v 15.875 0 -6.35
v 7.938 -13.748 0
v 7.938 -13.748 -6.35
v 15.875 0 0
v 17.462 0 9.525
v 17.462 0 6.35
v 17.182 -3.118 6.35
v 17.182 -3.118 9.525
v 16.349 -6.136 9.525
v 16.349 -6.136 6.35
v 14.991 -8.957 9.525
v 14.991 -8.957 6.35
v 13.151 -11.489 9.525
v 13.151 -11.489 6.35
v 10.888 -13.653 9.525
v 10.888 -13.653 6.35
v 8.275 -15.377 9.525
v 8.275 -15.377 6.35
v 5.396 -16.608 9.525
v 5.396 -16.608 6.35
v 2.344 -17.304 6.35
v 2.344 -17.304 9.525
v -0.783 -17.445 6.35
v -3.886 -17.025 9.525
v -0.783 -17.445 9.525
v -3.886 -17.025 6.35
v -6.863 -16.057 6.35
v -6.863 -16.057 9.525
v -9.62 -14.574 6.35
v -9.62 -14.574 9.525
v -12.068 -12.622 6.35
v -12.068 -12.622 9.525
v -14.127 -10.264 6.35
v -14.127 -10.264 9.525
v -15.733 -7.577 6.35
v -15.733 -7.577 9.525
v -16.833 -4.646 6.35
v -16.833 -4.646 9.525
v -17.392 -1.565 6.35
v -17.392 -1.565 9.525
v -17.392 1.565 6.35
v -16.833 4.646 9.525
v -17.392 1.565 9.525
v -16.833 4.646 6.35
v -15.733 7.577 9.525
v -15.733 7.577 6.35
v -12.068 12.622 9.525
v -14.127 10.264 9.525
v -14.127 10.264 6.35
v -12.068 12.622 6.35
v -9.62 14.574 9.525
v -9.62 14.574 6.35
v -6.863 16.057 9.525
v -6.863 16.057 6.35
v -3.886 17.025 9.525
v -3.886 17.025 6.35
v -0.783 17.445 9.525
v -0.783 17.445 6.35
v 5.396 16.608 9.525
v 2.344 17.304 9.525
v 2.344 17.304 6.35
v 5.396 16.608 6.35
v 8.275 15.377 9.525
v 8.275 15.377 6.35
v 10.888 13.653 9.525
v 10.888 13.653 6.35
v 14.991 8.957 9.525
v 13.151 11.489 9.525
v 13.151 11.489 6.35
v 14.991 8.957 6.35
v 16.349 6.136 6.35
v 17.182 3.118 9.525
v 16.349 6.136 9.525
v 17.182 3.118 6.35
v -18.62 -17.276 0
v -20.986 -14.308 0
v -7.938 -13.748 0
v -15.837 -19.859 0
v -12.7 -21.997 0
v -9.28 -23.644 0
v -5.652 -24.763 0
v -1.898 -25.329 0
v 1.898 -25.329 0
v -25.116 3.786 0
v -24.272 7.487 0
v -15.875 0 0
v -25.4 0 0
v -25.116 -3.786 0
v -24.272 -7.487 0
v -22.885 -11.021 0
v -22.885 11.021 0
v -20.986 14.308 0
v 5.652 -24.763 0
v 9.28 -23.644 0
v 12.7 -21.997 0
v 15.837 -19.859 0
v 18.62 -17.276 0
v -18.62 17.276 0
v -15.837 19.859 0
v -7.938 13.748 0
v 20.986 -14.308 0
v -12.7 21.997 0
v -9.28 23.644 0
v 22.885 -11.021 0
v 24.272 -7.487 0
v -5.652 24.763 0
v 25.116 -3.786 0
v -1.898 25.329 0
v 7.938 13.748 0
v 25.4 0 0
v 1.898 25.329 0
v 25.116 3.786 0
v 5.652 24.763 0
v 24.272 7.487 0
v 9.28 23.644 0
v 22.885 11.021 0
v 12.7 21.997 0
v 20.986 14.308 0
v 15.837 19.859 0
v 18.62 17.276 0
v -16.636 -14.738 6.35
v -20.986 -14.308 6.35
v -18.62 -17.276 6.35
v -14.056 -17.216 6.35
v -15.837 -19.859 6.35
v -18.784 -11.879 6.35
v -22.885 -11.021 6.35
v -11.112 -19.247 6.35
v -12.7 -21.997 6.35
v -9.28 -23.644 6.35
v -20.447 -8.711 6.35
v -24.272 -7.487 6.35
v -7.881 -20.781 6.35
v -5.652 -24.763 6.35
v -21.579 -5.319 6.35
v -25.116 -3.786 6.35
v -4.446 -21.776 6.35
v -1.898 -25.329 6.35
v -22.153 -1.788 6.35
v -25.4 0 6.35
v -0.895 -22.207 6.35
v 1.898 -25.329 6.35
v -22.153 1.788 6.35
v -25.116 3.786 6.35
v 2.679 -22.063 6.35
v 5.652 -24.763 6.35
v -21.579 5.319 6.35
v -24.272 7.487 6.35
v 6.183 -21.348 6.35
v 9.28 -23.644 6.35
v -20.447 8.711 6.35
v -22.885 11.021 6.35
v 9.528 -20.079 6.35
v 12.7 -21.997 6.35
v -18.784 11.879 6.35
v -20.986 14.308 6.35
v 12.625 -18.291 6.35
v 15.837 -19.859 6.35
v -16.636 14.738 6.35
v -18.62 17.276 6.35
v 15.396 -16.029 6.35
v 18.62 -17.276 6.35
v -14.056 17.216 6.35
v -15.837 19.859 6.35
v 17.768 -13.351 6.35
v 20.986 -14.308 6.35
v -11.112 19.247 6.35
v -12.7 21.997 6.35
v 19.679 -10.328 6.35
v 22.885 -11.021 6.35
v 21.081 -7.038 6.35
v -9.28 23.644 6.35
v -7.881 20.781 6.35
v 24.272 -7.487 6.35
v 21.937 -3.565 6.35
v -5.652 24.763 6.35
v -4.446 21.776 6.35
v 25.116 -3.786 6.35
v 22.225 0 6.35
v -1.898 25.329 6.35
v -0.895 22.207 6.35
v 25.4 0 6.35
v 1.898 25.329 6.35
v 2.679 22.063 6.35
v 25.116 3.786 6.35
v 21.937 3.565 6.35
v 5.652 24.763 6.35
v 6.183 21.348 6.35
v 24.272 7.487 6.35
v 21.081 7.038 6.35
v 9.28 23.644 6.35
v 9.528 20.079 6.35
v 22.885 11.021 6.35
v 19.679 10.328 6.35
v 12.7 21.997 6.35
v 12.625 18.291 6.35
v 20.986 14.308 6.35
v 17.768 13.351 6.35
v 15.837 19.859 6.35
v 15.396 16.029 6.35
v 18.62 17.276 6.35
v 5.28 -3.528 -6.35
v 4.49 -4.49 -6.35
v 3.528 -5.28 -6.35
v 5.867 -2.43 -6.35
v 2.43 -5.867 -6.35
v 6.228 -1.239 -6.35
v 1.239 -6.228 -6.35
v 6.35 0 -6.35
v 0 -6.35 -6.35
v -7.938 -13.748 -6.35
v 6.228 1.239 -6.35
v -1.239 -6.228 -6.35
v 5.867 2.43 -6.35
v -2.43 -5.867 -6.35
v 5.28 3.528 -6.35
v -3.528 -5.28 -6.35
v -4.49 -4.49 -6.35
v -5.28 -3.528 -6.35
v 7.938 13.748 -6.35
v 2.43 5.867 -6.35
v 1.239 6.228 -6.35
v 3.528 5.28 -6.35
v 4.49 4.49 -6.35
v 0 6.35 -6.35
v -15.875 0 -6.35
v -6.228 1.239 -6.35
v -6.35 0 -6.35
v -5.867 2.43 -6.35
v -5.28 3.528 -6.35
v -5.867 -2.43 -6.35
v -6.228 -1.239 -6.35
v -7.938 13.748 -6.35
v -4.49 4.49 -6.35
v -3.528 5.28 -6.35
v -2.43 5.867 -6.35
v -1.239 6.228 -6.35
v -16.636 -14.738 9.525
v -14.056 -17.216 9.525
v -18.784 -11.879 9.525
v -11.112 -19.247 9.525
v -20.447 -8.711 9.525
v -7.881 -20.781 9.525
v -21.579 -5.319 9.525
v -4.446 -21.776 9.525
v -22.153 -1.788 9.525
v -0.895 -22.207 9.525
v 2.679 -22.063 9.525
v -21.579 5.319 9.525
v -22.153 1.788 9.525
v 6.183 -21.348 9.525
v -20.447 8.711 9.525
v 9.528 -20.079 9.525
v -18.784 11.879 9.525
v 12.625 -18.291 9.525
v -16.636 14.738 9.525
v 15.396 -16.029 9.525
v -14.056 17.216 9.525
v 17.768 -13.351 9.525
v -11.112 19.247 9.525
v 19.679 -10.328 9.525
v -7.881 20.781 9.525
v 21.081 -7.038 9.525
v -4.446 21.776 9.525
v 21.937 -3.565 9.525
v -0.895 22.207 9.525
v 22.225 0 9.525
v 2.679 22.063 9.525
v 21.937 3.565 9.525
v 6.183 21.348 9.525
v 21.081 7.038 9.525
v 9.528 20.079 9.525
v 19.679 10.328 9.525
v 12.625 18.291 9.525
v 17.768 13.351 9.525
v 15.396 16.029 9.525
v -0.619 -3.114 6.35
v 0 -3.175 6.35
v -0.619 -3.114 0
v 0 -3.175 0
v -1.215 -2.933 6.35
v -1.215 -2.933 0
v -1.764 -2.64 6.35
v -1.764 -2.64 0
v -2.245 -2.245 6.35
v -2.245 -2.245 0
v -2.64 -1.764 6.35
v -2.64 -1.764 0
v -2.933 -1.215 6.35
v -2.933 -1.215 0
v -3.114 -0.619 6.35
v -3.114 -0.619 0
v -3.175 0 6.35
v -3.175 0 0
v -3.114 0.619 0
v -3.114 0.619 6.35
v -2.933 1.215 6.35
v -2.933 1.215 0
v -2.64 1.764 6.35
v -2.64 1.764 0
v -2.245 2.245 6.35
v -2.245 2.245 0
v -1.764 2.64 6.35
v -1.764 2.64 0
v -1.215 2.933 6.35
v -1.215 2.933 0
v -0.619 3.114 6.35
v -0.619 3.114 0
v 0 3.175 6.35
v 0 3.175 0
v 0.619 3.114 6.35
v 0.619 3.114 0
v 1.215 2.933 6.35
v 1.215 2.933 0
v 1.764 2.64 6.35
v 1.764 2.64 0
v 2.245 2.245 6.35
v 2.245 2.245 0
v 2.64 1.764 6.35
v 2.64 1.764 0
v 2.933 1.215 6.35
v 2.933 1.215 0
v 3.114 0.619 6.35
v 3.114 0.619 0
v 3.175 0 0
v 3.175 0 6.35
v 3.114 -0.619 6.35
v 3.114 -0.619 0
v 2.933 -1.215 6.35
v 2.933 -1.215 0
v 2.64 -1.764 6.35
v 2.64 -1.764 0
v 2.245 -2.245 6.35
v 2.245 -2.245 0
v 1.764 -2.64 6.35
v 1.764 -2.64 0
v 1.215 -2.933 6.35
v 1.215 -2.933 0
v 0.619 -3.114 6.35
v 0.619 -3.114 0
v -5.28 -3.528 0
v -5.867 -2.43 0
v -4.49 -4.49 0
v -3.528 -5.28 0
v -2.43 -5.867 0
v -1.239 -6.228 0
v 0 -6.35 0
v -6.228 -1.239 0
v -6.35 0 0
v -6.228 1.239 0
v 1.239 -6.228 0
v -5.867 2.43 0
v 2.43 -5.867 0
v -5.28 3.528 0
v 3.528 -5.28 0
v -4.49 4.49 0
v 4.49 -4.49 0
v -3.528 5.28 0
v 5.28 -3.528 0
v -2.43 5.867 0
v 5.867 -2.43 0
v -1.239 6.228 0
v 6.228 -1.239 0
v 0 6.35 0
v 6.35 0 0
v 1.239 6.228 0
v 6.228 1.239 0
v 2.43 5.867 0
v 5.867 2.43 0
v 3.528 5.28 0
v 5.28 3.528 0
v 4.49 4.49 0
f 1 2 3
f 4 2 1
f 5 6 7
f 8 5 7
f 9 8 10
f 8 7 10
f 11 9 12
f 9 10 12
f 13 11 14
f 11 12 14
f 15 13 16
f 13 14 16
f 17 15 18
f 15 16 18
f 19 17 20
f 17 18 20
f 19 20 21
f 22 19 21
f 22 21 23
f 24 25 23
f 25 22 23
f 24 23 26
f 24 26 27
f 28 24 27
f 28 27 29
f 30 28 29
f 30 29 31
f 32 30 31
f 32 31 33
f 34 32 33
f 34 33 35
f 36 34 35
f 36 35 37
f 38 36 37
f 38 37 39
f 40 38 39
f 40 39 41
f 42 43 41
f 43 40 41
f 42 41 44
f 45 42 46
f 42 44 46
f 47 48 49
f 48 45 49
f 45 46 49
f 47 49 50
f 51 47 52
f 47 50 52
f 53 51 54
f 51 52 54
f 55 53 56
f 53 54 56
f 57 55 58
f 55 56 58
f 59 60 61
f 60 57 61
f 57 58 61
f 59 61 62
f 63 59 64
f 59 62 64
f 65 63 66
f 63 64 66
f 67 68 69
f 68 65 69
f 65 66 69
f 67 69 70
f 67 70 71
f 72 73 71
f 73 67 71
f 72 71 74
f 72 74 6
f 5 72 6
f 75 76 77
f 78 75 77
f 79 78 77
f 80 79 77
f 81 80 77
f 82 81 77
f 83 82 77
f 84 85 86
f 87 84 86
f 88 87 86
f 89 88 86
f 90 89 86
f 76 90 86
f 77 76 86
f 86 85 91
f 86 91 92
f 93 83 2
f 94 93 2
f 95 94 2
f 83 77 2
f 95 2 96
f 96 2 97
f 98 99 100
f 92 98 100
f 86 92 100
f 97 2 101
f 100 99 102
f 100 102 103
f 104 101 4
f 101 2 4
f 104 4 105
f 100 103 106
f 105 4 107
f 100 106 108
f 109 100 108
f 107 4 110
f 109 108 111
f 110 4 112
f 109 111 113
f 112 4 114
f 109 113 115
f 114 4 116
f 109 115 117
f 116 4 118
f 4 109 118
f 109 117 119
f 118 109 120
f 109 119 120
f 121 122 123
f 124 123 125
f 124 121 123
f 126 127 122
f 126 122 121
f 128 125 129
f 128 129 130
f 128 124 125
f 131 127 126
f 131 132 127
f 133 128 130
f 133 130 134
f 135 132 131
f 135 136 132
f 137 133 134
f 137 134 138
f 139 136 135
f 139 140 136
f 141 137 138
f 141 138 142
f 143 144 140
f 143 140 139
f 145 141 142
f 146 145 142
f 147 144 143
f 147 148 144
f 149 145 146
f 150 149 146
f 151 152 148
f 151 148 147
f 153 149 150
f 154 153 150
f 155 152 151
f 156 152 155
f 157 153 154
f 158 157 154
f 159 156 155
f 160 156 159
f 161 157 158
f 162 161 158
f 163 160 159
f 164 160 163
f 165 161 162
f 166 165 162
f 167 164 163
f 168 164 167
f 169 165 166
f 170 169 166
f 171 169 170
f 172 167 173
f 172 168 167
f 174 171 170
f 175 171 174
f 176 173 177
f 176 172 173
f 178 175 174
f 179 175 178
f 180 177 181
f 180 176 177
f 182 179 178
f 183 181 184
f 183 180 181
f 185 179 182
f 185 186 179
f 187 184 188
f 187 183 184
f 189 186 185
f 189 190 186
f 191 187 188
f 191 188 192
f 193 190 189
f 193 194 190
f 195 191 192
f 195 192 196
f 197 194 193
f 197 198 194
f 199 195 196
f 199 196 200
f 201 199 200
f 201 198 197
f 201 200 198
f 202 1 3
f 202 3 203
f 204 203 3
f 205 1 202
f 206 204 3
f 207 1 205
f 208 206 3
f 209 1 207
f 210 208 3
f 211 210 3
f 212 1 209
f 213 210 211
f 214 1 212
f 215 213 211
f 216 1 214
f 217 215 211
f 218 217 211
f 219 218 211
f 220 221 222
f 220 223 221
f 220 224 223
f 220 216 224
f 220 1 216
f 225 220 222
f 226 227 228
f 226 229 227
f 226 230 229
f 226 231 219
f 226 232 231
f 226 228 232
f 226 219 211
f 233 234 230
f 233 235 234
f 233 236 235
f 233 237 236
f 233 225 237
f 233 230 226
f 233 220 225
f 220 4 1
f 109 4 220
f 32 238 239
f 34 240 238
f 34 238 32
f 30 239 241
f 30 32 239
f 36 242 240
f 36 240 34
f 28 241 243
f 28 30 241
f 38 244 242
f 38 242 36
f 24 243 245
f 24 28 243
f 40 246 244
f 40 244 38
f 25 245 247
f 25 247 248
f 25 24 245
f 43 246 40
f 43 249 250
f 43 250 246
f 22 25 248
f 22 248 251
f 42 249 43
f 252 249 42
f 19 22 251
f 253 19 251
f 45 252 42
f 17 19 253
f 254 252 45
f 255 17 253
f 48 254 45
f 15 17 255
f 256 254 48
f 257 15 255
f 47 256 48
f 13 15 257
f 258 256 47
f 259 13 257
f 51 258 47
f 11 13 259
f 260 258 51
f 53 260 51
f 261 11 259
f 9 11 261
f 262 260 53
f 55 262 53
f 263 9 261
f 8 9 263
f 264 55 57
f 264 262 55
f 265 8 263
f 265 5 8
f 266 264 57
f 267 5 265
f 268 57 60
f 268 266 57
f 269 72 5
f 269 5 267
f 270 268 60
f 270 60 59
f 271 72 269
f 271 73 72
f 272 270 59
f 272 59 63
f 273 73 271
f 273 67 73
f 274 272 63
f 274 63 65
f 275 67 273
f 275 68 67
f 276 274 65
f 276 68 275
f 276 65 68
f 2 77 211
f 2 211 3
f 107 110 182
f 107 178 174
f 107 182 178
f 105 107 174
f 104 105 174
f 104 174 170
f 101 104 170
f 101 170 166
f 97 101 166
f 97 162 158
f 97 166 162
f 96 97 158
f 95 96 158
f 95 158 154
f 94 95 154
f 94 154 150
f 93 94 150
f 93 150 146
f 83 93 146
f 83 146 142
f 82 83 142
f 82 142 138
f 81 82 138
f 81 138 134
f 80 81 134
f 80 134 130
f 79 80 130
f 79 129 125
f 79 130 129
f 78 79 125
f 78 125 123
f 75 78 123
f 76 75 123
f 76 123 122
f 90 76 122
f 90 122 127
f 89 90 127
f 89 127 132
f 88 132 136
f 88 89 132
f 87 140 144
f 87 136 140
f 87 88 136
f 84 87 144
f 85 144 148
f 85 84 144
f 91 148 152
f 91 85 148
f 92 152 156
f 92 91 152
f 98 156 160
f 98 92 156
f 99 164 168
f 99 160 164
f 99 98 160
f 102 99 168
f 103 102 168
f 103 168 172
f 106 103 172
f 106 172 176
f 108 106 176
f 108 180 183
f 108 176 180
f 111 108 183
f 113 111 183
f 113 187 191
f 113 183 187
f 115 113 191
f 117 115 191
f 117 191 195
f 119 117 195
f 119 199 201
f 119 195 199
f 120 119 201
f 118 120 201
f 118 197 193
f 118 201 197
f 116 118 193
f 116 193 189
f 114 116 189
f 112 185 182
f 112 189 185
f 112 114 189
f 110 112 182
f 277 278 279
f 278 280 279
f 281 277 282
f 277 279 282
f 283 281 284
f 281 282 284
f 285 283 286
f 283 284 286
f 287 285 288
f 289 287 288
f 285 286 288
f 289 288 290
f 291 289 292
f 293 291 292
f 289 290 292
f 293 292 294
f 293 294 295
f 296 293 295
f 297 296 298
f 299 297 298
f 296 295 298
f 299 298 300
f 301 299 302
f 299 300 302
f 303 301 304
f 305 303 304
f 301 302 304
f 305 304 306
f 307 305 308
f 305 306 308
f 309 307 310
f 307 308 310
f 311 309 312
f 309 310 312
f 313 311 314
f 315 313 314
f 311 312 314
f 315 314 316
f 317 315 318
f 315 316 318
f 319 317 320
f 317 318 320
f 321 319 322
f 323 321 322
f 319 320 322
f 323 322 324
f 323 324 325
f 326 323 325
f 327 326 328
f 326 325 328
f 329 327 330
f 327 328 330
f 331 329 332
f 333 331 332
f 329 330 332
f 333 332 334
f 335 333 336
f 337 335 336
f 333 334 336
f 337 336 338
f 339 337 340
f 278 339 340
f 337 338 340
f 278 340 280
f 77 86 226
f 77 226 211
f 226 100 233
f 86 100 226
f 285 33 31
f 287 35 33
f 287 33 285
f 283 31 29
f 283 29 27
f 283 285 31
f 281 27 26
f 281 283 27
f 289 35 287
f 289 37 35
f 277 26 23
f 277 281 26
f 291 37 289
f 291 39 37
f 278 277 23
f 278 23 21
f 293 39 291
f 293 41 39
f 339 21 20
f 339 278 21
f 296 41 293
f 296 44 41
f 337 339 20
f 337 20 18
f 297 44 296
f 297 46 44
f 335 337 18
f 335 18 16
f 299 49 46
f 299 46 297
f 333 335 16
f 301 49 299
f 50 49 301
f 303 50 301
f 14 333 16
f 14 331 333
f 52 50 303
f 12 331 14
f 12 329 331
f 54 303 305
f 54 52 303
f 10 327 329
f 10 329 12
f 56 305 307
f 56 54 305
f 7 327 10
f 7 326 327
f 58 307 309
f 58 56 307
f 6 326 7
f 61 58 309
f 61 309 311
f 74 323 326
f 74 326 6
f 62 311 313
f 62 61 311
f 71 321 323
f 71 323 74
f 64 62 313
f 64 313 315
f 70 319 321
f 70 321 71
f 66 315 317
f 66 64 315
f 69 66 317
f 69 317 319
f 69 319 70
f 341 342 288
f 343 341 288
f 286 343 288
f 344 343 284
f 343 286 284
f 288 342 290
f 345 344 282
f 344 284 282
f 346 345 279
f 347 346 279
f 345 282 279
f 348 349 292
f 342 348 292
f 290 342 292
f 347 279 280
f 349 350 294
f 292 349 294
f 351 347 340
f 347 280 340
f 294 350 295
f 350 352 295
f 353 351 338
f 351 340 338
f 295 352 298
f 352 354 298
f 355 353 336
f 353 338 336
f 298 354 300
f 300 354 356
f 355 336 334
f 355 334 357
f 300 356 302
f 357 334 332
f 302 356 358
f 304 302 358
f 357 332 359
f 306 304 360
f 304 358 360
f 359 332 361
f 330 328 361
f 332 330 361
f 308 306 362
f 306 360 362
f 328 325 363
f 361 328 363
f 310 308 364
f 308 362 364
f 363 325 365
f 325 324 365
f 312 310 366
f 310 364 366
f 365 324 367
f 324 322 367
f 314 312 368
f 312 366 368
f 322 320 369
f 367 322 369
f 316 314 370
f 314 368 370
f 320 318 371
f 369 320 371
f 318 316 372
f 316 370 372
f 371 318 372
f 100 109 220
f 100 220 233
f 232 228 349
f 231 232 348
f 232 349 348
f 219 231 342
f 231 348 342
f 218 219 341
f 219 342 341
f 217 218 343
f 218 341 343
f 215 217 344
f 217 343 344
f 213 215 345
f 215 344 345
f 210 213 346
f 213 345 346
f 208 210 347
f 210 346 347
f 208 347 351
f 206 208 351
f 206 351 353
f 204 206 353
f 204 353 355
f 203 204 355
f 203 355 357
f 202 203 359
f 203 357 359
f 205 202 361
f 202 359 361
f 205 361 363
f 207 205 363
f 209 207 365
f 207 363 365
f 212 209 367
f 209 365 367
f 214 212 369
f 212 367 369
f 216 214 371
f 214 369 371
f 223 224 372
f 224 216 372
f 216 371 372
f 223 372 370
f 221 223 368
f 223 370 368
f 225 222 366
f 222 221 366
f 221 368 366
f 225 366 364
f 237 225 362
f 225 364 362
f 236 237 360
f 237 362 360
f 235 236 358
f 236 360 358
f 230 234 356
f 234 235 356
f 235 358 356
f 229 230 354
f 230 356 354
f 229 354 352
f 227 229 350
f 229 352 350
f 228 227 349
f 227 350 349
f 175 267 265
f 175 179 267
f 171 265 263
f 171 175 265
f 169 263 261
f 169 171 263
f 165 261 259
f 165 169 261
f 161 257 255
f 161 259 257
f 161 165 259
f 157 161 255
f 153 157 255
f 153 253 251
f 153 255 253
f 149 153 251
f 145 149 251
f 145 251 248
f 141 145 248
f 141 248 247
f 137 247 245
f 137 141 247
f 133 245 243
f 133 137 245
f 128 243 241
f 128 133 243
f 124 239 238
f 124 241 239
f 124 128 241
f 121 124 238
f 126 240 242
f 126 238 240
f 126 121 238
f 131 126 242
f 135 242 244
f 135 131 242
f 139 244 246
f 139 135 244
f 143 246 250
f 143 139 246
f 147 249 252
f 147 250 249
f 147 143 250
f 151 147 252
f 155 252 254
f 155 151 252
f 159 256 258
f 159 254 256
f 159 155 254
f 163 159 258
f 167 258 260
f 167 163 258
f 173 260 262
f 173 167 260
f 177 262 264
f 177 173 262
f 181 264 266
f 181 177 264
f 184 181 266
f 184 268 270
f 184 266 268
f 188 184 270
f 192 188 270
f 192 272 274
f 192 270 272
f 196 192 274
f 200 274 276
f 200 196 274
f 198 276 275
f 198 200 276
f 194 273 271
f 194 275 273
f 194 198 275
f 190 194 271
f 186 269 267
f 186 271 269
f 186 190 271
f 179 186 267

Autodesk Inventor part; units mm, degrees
ref_plane "YZ Plane" through (0, 0, 0) normal (1, 0, 0) x (0, 1, 0)
ref_plane "XZ Plane" through (0, 0, 0) normal (0, 1, 0) x (-1, 0, 0)
ref_plane "XY Plane" through (0, 0, 0) normal (0, 0, 1) x (1, 0, 0)
sketch "Sketch1" plane through (0, 0, 0) normal (0, 0, 1) x (1, 0, 0)
  circle A0 centre (0, 0) radius 25.4
  dimension "d0" = 50.8
extrude "Extrusion1" add sketch "Sketch1" along normal blind 6.35
sketch "Sketch2" plane through (0, 0, 6.35) normal (0, 0, 1) x (1, 0, 0)
  circle A0 centre (0, 0) radius 17.4625
  circle A1 centre (0, 0) radius 22.225
  dimension "d3" = 34.925
  dimension "d4" = 44.45
extrude "Extrusion2" add sketch "Sketch2" along normal blind 3.175
sketch "Sketch3" plane through (0, 0, 0) normal (0, 0, -1) x (-1, 0, 0)
  line L0 (-15.875, 0) -> (-7.9375, 13.7482)
  line L1 (-7.9375, 13.7482) -> (7.9375, 13.7482)
  line L2 (7.9375, 13.7482) -> (15.875, 0)
  line L3 (15.875, 0) -> (7.9375, -13.7482)
  line L4 (7.9375, -13.7482) -> (-7.9375, -13.7482)
  line L5 (-7.9375, -13.7482) -> (-15.875, 0)
  circle A0 centre (0, 0) radius 6.35
  line L6 (0, -35.56) -> (0, 35.56) projected
  line L7 (-35.56, 0) -> (35.56, 0) projected
  dimension "d7" = 15.875
  dimension "d8" = 12.7
extrude "Extrusion3" add sketch "Sketch3" along normal blind 6.35 contours L7 A0 L6 L4 L5 | L0 L1 L6 A0 L7 | L1 L2 L7 A0 L6 | L6 A0 L7 L3 L4
hole "Hole1" at (0, 0, 6.35) direction (0, 0, -1) diameter 6.35 end through all
properties part number "2sides"
